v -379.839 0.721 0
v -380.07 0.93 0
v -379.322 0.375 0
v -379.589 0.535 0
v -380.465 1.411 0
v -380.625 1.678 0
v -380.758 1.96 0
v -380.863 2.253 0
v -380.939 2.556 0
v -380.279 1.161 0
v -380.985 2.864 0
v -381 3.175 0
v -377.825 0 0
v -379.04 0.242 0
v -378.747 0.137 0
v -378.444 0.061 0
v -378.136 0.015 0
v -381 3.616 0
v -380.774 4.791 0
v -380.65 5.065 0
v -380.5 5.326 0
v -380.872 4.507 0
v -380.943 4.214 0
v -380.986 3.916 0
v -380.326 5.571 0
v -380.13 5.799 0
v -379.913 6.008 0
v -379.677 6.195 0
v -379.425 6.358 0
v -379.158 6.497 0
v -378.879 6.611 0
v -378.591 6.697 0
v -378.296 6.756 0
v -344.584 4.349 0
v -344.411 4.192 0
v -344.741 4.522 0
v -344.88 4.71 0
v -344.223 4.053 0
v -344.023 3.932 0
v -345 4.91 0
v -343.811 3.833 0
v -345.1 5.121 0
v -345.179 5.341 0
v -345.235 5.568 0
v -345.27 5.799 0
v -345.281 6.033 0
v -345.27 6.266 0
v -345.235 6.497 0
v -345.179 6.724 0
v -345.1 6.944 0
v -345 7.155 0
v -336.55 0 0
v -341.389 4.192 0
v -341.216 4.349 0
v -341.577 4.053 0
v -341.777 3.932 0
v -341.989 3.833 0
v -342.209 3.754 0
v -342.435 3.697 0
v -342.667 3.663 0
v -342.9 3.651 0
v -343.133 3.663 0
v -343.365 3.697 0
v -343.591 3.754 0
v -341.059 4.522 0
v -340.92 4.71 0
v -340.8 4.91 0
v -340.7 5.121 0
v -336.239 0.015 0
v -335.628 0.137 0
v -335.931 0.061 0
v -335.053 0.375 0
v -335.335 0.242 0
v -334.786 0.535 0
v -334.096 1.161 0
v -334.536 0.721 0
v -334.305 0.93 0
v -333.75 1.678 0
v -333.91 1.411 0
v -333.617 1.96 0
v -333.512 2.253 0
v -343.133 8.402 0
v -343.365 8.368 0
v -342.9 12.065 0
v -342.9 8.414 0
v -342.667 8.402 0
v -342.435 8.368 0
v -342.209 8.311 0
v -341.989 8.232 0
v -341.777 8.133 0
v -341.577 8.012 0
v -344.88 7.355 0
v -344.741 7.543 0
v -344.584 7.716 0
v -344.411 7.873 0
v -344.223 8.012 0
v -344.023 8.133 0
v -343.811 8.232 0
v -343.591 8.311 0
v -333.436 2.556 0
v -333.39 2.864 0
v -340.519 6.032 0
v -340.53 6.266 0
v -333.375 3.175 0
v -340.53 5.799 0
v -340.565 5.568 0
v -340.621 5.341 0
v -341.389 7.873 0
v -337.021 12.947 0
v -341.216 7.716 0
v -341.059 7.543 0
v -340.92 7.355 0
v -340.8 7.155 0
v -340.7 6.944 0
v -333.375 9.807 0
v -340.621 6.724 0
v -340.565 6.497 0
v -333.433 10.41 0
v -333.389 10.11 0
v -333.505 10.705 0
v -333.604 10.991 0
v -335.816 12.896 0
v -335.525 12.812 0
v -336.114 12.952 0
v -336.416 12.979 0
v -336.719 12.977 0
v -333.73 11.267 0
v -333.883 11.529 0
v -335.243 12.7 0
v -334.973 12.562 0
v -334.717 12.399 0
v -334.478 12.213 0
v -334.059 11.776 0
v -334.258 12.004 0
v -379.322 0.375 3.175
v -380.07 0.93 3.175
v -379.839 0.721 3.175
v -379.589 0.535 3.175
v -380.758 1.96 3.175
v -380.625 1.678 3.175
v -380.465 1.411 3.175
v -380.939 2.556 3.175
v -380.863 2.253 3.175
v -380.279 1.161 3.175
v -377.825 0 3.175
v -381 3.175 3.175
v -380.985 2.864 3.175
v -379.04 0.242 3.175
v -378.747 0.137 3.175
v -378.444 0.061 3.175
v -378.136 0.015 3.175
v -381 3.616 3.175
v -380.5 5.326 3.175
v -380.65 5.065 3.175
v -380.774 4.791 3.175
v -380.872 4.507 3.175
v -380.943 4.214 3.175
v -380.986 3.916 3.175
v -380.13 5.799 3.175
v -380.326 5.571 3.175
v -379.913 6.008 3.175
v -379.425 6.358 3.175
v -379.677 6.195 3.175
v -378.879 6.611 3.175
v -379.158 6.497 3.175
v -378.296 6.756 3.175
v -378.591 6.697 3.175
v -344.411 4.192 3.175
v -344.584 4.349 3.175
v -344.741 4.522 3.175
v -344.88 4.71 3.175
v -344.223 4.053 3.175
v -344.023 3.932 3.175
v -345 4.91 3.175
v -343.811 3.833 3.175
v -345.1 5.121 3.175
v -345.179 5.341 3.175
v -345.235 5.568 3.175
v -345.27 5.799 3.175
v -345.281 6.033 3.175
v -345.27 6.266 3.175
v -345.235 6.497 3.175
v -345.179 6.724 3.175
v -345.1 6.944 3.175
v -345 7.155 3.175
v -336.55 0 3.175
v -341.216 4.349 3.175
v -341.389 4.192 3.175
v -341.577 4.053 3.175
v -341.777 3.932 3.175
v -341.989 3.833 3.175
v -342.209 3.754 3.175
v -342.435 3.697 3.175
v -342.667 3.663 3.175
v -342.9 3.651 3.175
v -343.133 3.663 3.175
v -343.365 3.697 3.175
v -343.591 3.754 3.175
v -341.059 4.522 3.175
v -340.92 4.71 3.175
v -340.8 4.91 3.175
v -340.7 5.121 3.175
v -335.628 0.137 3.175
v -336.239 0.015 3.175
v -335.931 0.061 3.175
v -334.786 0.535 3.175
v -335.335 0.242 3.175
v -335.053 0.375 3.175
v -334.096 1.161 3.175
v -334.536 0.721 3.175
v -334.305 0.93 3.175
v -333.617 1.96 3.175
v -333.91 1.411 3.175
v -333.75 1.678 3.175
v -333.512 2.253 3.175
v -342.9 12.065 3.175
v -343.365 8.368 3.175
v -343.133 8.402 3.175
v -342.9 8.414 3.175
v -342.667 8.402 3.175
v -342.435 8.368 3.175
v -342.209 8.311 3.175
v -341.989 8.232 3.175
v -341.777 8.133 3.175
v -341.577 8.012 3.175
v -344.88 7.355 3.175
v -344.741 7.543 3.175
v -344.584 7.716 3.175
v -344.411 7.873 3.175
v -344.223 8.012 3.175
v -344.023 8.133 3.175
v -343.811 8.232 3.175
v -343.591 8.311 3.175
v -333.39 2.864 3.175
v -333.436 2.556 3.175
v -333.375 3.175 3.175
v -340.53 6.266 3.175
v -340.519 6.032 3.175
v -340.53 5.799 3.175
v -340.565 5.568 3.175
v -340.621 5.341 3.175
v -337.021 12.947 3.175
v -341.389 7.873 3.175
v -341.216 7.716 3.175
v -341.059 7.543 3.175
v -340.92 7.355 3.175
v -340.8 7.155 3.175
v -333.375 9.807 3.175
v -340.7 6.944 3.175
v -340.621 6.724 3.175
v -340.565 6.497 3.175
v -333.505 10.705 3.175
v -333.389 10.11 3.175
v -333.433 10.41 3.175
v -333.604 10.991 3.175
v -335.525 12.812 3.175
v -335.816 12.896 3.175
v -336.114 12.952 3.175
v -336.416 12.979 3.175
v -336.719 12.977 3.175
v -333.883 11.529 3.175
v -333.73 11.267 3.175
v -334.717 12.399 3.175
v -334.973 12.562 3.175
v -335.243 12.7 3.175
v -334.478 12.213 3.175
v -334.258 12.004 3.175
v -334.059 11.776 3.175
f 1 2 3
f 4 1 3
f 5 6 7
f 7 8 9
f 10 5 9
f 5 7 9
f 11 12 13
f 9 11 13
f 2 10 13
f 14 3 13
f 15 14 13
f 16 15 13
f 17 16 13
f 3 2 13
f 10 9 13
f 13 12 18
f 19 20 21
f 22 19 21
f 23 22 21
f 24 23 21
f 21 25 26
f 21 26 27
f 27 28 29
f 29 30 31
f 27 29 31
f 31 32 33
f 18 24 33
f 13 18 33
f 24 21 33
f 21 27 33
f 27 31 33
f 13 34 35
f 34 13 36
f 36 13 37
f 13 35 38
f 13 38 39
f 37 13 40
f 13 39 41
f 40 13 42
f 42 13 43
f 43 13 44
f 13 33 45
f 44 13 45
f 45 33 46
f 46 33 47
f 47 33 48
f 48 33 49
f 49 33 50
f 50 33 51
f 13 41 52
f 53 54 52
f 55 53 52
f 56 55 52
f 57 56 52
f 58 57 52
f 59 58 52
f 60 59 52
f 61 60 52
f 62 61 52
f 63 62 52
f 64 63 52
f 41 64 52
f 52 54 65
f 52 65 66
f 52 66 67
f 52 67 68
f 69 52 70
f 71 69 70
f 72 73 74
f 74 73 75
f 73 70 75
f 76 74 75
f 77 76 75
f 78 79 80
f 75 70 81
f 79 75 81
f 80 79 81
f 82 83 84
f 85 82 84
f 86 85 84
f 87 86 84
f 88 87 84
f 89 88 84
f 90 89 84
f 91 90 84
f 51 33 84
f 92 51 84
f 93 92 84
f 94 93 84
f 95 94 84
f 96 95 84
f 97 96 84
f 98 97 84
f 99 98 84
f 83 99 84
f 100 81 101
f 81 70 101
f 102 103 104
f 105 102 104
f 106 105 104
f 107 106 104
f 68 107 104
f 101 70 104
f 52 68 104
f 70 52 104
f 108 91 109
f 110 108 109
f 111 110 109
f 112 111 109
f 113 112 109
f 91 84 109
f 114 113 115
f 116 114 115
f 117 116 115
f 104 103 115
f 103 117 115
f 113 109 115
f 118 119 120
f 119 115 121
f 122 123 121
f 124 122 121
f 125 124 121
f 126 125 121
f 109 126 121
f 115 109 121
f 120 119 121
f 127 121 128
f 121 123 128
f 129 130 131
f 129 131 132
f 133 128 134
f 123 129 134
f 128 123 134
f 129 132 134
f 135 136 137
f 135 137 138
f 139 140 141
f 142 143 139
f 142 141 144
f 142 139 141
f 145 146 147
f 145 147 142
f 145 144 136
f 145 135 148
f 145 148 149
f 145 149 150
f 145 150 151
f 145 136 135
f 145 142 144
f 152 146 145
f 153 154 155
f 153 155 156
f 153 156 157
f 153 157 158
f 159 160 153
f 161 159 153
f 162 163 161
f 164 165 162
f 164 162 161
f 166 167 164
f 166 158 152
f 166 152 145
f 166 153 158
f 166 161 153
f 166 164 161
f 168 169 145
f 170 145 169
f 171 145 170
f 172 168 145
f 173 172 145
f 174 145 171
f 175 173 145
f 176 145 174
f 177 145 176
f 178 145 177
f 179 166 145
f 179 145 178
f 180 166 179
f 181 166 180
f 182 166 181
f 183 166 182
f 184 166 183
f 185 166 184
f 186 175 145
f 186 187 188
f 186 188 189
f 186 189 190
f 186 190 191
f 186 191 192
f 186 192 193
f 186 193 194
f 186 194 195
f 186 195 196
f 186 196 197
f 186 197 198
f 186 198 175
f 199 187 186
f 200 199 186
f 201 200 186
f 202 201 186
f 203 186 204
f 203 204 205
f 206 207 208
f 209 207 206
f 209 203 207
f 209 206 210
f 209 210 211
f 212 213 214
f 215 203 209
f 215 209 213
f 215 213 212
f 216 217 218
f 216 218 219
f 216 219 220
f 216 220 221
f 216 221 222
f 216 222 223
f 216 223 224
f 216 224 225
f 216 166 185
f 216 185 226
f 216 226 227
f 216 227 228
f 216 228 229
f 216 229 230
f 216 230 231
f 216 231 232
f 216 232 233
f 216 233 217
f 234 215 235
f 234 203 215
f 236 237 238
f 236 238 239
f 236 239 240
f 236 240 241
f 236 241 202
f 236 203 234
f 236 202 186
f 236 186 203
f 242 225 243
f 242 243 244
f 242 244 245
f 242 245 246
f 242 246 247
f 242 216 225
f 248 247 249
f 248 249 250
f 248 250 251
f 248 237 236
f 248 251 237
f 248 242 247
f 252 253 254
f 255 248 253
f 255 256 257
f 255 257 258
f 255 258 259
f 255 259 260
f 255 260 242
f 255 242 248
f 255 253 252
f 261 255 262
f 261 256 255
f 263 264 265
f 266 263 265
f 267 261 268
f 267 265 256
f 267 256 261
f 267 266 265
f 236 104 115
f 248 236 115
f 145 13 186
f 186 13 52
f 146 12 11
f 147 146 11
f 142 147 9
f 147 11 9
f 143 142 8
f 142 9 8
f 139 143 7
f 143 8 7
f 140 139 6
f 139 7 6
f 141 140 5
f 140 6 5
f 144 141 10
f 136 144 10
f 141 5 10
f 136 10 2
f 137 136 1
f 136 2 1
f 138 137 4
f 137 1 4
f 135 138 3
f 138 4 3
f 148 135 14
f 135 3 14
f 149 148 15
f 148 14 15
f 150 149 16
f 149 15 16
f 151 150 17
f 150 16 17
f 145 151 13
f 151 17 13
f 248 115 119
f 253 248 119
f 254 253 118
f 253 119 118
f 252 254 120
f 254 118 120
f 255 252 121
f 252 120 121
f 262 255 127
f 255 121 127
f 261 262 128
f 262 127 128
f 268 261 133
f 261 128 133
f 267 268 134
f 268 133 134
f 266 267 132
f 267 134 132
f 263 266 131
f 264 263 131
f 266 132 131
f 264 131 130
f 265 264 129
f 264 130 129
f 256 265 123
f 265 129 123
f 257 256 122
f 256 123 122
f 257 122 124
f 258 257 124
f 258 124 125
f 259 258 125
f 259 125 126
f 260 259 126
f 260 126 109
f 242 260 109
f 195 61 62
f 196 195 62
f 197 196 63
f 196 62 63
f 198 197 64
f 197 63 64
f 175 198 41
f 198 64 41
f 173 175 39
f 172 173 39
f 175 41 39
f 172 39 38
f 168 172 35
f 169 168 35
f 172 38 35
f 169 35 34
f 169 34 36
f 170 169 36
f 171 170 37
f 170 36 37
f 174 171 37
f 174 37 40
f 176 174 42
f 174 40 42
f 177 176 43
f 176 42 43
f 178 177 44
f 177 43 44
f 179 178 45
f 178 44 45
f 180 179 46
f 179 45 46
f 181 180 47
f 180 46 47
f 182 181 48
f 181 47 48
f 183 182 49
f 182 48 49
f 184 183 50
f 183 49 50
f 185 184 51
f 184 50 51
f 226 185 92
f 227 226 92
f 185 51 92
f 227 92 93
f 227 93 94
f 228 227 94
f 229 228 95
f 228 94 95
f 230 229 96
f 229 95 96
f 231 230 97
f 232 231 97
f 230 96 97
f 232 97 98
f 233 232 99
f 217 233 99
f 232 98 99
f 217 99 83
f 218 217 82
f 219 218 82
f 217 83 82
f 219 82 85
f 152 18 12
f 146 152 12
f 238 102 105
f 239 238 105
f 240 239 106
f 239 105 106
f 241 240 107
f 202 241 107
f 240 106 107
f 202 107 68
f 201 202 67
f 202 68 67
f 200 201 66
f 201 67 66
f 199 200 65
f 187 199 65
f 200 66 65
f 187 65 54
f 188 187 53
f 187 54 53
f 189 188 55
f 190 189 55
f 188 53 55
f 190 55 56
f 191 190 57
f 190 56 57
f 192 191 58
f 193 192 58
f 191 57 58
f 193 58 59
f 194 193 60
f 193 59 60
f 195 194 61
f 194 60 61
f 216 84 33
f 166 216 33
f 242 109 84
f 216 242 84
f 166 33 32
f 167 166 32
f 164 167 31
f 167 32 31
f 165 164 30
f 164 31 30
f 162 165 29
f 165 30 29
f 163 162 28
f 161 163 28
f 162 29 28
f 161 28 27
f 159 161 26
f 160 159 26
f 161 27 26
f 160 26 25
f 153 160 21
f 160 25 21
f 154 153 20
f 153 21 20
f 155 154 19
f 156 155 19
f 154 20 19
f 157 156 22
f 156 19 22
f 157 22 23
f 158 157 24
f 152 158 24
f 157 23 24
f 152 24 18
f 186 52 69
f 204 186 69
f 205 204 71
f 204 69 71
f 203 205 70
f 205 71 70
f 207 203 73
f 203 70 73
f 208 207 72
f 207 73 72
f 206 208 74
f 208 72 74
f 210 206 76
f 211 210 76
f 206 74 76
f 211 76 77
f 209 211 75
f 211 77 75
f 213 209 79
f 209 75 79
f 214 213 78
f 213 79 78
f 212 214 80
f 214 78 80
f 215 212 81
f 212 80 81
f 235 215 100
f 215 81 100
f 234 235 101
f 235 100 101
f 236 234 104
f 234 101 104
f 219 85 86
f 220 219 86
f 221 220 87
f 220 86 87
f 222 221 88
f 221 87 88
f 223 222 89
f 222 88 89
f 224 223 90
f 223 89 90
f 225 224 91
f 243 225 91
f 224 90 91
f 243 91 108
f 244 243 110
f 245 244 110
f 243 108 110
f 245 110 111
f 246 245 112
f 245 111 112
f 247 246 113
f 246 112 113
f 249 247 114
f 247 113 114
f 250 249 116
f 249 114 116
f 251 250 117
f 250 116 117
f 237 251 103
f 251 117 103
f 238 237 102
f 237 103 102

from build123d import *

# Parameters (mm, degrees)
BOSS_EXTRUDE1_DEPTH = 3.175


with BuildPart() as part:
    # Sketch1 → Boss-Extrude1 (new body)
    with BuildSketch(Plane.XY):
        with BuildLine():
            Line((-381, 3.615729939), (-381, 3.175))
            ThreePointArc((-381, 3.175), (-380.07006403, 0.92993597), (-377.825, 0))
            Line((-377.825, 0), (-342.9, 0))
            Line((-342.9, 0), (-342.9, 3.65125))
            ThreePointArc((-342.9, 3.65125), (-345.28125, 6.0325), (-342.9, 8.41375))
            Line((-342.9, 8.41375), (-342.9, 12.065))
            Line((-342.9, 12.065), (-378.295980938, 6.755602859))
            ThreePointArc((-378.295980938, 6.755602859), (-380.230825168, 5.68759631), (-381, 3.615729939))
        make_face()
        with BuildLine():
            Line((-342.9, 3.65125), (-342.9, 0))
            Line((-342.9, 0), (-336.55, 0))
            ThreePointArc((-336.55, 0), (-334.30493597, 0.92993597), (-333.375, 3.175))
            Line((-333.375, 3.175), (-333.375, 9.806979939))
            ThreePointArc((-333.375, 9.806979939), (-334.478133629, 12.212805107), (-337.020980938, 12.946852859))
            Line((-337.020980938, 12.946852859), (-342.9, 12.065))
            Line((-342.9, 12.065), (-342.9, 8.41375))
            ThreePointArc((-342.9, 8.41375), (-341.216201977, 7.716298023), (-340.51875, 6.0325))
            ThreePointArc((-340.51875, 6.0325), (-341.216201977, 4.348701977), (-342.9, 3.65125))
        make_face()
    extrude(amount=BOSS_EXTRUDE1_DEPTH)


solid = part.part
